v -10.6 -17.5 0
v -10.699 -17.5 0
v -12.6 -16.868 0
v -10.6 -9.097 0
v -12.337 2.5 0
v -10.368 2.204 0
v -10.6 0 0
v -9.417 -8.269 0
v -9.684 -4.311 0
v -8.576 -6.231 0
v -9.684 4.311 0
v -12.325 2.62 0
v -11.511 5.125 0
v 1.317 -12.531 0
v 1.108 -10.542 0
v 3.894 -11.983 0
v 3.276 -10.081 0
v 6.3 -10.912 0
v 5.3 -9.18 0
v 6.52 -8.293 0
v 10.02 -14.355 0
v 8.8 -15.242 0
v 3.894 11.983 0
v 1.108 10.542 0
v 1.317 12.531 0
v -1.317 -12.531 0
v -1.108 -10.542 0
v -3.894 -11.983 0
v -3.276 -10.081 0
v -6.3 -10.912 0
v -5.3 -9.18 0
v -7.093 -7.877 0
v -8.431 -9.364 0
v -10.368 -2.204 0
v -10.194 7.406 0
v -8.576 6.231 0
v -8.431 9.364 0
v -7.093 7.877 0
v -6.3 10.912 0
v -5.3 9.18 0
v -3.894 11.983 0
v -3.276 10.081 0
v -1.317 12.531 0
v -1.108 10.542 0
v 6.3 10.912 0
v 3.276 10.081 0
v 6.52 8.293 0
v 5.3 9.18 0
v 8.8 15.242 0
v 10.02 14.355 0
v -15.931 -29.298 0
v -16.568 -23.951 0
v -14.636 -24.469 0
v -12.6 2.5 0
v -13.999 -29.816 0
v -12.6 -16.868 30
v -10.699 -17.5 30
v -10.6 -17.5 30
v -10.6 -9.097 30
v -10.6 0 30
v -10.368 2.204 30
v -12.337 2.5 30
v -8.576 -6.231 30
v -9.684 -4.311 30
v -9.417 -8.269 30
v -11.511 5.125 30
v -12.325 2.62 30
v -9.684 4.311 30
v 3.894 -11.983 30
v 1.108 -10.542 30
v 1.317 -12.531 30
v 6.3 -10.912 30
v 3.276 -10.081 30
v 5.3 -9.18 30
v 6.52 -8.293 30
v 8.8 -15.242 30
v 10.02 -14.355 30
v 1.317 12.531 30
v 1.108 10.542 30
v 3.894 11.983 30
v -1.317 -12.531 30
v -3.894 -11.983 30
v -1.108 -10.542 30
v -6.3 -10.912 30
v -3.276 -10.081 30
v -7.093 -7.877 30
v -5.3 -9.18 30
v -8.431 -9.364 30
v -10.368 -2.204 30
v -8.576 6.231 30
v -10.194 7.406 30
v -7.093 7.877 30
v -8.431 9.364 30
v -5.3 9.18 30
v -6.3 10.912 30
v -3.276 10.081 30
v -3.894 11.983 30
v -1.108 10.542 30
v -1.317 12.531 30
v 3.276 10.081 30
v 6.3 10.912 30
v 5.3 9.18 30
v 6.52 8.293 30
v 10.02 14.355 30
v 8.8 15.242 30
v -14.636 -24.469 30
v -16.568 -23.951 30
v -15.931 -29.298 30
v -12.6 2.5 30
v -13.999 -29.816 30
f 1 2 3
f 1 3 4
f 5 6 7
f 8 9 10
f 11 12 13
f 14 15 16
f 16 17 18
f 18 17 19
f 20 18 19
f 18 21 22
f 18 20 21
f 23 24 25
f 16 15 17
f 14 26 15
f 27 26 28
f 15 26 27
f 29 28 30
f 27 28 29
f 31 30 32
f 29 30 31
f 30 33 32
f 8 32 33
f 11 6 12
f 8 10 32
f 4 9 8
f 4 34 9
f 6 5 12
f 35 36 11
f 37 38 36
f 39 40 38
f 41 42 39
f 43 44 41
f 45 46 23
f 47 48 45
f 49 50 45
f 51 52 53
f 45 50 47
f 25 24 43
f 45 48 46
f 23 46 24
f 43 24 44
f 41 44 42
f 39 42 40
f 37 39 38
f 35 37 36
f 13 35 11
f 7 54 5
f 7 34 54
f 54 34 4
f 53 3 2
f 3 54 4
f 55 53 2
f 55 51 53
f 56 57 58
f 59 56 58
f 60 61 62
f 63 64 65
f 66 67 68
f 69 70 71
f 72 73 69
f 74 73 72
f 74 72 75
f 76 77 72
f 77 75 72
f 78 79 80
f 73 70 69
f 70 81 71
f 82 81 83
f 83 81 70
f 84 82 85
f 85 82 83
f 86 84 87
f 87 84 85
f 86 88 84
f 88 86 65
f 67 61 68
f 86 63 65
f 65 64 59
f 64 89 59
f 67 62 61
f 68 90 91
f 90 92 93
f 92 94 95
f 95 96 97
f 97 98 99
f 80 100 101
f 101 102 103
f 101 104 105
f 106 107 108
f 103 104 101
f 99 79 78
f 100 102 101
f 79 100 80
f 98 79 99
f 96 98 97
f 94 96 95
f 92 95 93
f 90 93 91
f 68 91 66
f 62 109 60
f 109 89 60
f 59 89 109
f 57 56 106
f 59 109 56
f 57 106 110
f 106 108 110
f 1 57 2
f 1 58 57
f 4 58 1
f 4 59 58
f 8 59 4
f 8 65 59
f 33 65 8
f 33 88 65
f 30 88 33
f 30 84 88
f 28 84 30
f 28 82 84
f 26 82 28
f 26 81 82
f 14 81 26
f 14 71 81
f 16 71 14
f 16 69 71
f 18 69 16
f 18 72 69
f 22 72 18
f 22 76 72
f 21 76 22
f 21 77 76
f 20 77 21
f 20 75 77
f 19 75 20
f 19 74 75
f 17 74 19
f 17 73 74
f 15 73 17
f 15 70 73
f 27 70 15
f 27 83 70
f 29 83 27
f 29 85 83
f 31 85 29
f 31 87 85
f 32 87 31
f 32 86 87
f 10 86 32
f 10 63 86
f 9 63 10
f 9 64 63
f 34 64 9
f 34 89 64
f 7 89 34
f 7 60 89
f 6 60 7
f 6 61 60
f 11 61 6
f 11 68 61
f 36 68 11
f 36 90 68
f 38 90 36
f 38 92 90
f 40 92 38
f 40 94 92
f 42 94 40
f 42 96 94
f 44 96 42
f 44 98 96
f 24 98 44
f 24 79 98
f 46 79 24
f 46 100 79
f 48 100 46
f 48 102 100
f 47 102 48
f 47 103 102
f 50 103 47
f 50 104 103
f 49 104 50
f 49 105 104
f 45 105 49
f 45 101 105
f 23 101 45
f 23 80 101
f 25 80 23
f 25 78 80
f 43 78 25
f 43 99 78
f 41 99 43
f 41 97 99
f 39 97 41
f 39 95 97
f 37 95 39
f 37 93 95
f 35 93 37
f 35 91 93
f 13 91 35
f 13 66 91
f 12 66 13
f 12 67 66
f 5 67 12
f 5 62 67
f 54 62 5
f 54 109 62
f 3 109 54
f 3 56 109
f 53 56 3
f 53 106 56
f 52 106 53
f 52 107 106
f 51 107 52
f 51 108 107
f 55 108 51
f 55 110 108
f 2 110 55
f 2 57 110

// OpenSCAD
//overall width of clip, in mm, measure hardhat slot
clip_width=30; 

//Diameter of flashlight, in mm
diam=21.2;

//Thickness of clip, in mm
thickness=2;

//length of release tab, in mm
release_tab_length=5;

//Locking clip angle, in degrees; More angle = tighter/"snappier" fit
locking_clip_angle=15;

//Adjust this larger to reach deeper into hard hat slot
locking_clip_reach=13;

//Width of barb, in mm: Wider barb = more secure locking action
locking_clip_barb_size=2;




module insertion_tabs() //tabs at mouth of clip (draws a big wide triangle
{
polygon(points=[[0,0],[50,50*sqrt(3)],[50,-50*sqrt(3)]],path=[[0,1,2]]);
}

module insertion_tabs_trim() //trims off big triangle leaving the two tabs
{
translate([(thickness/2)*sqrt(3),0])
{
polygon(points=[[0,0],[50,50*sqrt(3)],[50,-50*sqrt(3)]],path=[[0,1,2]]);
}
difference()
{
circle(r=100);
circle(r=(diam/2)+thickness+release_tab_length);
}
}

module brace() //adds a little fillet between circle and tab
{
translate([-(diam/2)-thickness,-0.38*diam,0])
{
rotate(-55,[0,0,1])
{
square([2,7]);
}
}
}

module clip_segment1() //draws first half of tongue
{
translate([-(diam/2)-(thickness-1),-7.5,0])
{
square([2,20], center=true);
}
}


module clip_segment2() //draws second(bent) half of tongue
{
translate([-(diam/2)-(thickness-1)-(0.5*locking_clip_reach*sin(locking_clip_angle)),-(17+(0.5*locking_clip_reach*cos(locking_clip_angle))),0])
{
rotate(-locking_clip_angle,[0,0,1])
{
square([2,locking_clip_reach], center=true);
polygon(points=[[-1,-(locking_clip_reach/2)],[-1,-(locking_clip_reach/2)+5],[-1-locking_clip_barb_size,-(locking_clip_reach/2)+5]],paths=[[0,1,2]]);
}
}
}

//main body
linear_extrude(height=clip_width)
{
union()
{
difference()
{
	union()
	{
		circle(r=(diam/2)+thickness);
		insertion_tabs();
		brace();	
}	
circle(r=(diam/2));
insertion_tabs_trim();
}
clip_segment1();
clip_segment2();

}
}
